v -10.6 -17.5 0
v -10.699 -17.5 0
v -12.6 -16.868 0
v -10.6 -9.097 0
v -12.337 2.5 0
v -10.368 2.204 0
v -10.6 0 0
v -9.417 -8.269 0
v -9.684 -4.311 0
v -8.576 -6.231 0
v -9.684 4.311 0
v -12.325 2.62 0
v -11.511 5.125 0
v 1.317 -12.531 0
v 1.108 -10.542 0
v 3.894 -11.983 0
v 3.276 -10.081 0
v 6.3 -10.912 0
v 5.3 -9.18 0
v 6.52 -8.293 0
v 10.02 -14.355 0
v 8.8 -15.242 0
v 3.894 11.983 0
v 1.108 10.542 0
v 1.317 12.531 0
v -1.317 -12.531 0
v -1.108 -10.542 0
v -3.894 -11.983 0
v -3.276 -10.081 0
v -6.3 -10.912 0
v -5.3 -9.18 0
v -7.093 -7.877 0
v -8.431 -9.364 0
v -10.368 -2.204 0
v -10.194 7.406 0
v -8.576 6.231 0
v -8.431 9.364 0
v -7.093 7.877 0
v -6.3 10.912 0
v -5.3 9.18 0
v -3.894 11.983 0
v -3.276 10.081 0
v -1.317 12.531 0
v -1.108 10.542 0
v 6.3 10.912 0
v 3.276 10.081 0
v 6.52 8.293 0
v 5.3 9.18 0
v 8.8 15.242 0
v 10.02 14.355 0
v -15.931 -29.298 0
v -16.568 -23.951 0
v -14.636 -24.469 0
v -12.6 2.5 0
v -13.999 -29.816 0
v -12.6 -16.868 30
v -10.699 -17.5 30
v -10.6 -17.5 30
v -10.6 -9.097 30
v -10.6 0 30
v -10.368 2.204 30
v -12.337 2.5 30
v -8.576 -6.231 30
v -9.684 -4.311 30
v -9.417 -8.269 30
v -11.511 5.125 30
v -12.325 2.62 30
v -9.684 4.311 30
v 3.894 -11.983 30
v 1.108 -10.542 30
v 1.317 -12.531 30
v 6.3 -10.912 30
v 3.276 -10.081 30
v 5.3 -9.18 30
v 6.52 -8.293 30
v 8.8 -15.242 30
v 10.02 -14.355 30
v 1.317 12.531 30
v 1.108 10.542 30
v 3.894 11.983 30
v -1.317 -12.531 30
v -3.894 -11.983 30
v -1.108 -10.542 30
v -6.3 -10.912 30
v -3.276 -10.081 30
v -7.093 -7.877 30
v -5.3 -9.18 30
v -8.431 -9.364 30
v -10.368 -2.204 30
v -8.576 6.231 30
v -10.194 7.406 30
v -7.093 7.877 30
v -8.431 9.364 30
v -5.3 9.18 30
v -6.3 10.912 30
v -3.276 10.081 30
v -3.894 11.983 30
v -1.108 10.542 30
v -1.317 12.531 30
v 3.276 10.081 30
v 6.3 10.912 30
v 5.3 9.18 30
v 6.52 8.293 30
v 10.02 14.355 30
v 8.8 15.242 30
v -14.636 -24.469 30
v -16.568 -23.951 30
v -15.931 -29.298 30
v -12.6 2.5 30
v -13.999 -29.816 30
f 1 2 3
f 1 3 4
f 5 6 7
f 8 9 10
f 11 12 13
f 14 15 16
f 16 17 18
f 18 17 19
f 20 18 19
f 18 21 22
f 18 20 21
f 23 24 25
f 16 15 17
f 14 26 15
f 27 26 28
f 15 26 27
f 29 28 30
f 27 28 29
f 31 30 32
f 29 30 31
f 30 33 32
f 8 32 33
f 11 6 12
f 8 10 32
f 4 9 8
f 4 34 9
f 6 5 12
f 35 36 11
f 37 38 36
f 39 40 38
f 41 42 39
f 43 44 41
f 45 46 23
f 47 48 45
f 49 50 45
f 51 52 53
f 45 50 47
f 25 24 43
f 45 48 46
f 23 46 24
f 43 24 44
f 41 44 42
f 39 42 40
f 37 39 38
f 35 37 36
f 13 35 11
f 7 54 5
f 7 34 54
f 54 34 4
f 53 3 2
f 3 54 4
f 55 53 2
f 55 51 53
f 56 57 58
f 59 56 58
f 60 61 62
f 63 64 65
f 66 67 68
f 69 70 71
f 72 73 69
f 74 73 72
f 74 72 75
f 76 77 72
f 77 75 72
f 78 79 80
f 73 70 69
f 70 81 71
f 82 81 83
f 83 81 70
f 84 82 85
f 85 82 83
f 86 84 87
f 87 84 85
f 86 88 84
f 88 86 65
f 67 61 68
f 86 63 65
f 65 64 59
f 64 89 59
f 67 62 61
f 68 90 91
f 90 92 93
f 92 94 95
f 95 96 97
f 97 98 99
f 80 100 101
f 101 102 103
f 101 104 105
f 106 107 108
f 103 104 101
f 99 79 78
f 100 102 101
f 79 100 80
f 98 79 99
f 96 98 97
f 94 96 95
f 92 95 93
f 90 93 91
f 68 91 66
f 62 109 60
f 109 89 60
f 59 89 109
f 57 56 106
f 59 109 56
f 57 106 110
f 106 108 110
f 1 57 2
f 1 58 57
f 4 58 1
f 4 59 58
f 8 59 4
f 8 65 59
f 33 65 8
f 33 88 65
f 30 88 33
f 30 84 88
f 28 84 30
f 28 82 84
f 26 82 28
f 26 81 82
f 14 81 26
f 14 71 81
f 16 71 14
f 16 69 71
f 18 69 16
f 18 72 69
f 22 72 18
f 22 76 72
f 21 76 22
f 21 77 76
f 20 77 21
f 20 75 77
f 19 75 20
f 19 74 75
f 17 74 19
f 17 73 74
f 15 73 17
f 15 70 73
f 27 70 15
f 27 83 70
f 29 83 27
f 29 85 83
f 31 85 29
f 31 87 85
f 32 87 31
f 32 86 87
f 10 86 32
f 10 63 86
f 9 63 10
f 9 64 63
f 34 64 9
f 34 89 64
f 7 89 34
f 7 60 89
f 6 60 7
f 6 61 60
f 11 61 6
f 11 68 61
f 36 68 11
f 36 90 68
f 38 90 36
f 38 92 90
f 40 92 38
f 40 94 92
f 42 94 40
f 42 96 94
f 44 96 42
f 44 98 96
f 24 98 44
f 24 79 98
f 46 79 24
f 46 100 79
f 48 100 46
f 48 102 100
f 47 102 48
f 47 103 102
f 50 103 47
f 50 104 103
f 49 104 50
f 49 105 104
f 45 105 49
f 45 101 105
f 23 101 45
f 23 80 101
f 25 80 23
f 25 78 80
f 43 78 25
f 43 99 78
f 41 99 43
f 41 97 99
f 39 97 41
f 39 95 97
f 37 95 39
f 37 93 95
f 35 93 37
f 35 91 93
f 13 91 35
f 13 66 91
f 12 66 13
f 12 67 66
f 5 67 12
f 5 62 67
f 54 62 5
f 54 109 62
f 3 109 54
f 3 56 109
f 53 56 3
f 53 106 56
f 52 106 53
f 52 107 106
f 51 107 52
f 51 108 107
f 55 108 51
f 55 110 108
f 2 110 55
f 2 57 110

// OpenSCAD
//overall width of clip, in mm, measure hardhat slot
clip_width=30; 

//Diameter of flashlight, in mm
diam=21.2;

//Thickness of clip, in mm
thickness=2;

//length of release tab, in mm
release_tab_length=5;

//Locking clip angle, in degrees; More angle = tighter/"snappier" fit
locking_clip_angle=15;

//Adjust this larger to reach deeper into hard hat slot
locking_clip_reach=13;

//Width of barb, in mm: Wider barb = more secure locking action
locking_clip_barb_size=2;




module insertion_tabs() //tabs at mouth of clip (draws a big wide triangle
{
polygon(points=[[0,0],[50,50*sqrt(3)],[50,-50*sqrt(3)]],path=[[0,1,2]]);
}

module insertion_tabs_trim() //trims off big triangle leaving the two tabs
{
translate([(thickness/2)*sqrt(3),0])
{
polygon(points=[[0,0],[50,50*sqrt(3)],[50,-50*sqrt(3)]],path=[[0,1,2]]);
}
difference()
{
circle(r=100);
circle(r=(diam/2)+thickness+release_tab_length);
}
}

module brace() //adds a little fillet between circle and tab
{
translate([-(diam/2)-thickness,-0.38*diam,0])
{
rotate(-55,[0,0,1])
{
square([2,7]);
}
}
}

module clip_segment1() //draws first half of tongue
{
translate([-(diam/2)-(thickness-1),-7.5,0])
{
square([2,20], center=true);
}
}


module clip_segment2() //draws second(bent) half of tongue
{
translate([-(diam/2)-(thickness-1)-(0.5*locking_clip_reach*sin(locking_clip_angle)),-(17+(0.5*locking_clip_reach*cos(locking_clip_angle))),0])
{
rotate(-locking_clip_angle,[0,0,1])
{
square([2,locking_clip_reach], center=true);
polygon(points=[[-1,-(locking_clip_reach/2)],[-1,-(locking_clip_reach/2)+5],[-1-locking_clip_barb_size,-(locking_clip_reach/2)+5]],paths=[[0,1,2]]);
}
}
}

//main body
linear_extrude(height=clip_width)
{
union()
{
difference()
{
	union()
	{
		circle(r=(diam/2)+thickness);
		insertion_tabs();
		brace();	
}	
circle(r=(diam/2));
insertion_tabs_trim();
}
clip_segment1();
clip_segment2();

}
}
